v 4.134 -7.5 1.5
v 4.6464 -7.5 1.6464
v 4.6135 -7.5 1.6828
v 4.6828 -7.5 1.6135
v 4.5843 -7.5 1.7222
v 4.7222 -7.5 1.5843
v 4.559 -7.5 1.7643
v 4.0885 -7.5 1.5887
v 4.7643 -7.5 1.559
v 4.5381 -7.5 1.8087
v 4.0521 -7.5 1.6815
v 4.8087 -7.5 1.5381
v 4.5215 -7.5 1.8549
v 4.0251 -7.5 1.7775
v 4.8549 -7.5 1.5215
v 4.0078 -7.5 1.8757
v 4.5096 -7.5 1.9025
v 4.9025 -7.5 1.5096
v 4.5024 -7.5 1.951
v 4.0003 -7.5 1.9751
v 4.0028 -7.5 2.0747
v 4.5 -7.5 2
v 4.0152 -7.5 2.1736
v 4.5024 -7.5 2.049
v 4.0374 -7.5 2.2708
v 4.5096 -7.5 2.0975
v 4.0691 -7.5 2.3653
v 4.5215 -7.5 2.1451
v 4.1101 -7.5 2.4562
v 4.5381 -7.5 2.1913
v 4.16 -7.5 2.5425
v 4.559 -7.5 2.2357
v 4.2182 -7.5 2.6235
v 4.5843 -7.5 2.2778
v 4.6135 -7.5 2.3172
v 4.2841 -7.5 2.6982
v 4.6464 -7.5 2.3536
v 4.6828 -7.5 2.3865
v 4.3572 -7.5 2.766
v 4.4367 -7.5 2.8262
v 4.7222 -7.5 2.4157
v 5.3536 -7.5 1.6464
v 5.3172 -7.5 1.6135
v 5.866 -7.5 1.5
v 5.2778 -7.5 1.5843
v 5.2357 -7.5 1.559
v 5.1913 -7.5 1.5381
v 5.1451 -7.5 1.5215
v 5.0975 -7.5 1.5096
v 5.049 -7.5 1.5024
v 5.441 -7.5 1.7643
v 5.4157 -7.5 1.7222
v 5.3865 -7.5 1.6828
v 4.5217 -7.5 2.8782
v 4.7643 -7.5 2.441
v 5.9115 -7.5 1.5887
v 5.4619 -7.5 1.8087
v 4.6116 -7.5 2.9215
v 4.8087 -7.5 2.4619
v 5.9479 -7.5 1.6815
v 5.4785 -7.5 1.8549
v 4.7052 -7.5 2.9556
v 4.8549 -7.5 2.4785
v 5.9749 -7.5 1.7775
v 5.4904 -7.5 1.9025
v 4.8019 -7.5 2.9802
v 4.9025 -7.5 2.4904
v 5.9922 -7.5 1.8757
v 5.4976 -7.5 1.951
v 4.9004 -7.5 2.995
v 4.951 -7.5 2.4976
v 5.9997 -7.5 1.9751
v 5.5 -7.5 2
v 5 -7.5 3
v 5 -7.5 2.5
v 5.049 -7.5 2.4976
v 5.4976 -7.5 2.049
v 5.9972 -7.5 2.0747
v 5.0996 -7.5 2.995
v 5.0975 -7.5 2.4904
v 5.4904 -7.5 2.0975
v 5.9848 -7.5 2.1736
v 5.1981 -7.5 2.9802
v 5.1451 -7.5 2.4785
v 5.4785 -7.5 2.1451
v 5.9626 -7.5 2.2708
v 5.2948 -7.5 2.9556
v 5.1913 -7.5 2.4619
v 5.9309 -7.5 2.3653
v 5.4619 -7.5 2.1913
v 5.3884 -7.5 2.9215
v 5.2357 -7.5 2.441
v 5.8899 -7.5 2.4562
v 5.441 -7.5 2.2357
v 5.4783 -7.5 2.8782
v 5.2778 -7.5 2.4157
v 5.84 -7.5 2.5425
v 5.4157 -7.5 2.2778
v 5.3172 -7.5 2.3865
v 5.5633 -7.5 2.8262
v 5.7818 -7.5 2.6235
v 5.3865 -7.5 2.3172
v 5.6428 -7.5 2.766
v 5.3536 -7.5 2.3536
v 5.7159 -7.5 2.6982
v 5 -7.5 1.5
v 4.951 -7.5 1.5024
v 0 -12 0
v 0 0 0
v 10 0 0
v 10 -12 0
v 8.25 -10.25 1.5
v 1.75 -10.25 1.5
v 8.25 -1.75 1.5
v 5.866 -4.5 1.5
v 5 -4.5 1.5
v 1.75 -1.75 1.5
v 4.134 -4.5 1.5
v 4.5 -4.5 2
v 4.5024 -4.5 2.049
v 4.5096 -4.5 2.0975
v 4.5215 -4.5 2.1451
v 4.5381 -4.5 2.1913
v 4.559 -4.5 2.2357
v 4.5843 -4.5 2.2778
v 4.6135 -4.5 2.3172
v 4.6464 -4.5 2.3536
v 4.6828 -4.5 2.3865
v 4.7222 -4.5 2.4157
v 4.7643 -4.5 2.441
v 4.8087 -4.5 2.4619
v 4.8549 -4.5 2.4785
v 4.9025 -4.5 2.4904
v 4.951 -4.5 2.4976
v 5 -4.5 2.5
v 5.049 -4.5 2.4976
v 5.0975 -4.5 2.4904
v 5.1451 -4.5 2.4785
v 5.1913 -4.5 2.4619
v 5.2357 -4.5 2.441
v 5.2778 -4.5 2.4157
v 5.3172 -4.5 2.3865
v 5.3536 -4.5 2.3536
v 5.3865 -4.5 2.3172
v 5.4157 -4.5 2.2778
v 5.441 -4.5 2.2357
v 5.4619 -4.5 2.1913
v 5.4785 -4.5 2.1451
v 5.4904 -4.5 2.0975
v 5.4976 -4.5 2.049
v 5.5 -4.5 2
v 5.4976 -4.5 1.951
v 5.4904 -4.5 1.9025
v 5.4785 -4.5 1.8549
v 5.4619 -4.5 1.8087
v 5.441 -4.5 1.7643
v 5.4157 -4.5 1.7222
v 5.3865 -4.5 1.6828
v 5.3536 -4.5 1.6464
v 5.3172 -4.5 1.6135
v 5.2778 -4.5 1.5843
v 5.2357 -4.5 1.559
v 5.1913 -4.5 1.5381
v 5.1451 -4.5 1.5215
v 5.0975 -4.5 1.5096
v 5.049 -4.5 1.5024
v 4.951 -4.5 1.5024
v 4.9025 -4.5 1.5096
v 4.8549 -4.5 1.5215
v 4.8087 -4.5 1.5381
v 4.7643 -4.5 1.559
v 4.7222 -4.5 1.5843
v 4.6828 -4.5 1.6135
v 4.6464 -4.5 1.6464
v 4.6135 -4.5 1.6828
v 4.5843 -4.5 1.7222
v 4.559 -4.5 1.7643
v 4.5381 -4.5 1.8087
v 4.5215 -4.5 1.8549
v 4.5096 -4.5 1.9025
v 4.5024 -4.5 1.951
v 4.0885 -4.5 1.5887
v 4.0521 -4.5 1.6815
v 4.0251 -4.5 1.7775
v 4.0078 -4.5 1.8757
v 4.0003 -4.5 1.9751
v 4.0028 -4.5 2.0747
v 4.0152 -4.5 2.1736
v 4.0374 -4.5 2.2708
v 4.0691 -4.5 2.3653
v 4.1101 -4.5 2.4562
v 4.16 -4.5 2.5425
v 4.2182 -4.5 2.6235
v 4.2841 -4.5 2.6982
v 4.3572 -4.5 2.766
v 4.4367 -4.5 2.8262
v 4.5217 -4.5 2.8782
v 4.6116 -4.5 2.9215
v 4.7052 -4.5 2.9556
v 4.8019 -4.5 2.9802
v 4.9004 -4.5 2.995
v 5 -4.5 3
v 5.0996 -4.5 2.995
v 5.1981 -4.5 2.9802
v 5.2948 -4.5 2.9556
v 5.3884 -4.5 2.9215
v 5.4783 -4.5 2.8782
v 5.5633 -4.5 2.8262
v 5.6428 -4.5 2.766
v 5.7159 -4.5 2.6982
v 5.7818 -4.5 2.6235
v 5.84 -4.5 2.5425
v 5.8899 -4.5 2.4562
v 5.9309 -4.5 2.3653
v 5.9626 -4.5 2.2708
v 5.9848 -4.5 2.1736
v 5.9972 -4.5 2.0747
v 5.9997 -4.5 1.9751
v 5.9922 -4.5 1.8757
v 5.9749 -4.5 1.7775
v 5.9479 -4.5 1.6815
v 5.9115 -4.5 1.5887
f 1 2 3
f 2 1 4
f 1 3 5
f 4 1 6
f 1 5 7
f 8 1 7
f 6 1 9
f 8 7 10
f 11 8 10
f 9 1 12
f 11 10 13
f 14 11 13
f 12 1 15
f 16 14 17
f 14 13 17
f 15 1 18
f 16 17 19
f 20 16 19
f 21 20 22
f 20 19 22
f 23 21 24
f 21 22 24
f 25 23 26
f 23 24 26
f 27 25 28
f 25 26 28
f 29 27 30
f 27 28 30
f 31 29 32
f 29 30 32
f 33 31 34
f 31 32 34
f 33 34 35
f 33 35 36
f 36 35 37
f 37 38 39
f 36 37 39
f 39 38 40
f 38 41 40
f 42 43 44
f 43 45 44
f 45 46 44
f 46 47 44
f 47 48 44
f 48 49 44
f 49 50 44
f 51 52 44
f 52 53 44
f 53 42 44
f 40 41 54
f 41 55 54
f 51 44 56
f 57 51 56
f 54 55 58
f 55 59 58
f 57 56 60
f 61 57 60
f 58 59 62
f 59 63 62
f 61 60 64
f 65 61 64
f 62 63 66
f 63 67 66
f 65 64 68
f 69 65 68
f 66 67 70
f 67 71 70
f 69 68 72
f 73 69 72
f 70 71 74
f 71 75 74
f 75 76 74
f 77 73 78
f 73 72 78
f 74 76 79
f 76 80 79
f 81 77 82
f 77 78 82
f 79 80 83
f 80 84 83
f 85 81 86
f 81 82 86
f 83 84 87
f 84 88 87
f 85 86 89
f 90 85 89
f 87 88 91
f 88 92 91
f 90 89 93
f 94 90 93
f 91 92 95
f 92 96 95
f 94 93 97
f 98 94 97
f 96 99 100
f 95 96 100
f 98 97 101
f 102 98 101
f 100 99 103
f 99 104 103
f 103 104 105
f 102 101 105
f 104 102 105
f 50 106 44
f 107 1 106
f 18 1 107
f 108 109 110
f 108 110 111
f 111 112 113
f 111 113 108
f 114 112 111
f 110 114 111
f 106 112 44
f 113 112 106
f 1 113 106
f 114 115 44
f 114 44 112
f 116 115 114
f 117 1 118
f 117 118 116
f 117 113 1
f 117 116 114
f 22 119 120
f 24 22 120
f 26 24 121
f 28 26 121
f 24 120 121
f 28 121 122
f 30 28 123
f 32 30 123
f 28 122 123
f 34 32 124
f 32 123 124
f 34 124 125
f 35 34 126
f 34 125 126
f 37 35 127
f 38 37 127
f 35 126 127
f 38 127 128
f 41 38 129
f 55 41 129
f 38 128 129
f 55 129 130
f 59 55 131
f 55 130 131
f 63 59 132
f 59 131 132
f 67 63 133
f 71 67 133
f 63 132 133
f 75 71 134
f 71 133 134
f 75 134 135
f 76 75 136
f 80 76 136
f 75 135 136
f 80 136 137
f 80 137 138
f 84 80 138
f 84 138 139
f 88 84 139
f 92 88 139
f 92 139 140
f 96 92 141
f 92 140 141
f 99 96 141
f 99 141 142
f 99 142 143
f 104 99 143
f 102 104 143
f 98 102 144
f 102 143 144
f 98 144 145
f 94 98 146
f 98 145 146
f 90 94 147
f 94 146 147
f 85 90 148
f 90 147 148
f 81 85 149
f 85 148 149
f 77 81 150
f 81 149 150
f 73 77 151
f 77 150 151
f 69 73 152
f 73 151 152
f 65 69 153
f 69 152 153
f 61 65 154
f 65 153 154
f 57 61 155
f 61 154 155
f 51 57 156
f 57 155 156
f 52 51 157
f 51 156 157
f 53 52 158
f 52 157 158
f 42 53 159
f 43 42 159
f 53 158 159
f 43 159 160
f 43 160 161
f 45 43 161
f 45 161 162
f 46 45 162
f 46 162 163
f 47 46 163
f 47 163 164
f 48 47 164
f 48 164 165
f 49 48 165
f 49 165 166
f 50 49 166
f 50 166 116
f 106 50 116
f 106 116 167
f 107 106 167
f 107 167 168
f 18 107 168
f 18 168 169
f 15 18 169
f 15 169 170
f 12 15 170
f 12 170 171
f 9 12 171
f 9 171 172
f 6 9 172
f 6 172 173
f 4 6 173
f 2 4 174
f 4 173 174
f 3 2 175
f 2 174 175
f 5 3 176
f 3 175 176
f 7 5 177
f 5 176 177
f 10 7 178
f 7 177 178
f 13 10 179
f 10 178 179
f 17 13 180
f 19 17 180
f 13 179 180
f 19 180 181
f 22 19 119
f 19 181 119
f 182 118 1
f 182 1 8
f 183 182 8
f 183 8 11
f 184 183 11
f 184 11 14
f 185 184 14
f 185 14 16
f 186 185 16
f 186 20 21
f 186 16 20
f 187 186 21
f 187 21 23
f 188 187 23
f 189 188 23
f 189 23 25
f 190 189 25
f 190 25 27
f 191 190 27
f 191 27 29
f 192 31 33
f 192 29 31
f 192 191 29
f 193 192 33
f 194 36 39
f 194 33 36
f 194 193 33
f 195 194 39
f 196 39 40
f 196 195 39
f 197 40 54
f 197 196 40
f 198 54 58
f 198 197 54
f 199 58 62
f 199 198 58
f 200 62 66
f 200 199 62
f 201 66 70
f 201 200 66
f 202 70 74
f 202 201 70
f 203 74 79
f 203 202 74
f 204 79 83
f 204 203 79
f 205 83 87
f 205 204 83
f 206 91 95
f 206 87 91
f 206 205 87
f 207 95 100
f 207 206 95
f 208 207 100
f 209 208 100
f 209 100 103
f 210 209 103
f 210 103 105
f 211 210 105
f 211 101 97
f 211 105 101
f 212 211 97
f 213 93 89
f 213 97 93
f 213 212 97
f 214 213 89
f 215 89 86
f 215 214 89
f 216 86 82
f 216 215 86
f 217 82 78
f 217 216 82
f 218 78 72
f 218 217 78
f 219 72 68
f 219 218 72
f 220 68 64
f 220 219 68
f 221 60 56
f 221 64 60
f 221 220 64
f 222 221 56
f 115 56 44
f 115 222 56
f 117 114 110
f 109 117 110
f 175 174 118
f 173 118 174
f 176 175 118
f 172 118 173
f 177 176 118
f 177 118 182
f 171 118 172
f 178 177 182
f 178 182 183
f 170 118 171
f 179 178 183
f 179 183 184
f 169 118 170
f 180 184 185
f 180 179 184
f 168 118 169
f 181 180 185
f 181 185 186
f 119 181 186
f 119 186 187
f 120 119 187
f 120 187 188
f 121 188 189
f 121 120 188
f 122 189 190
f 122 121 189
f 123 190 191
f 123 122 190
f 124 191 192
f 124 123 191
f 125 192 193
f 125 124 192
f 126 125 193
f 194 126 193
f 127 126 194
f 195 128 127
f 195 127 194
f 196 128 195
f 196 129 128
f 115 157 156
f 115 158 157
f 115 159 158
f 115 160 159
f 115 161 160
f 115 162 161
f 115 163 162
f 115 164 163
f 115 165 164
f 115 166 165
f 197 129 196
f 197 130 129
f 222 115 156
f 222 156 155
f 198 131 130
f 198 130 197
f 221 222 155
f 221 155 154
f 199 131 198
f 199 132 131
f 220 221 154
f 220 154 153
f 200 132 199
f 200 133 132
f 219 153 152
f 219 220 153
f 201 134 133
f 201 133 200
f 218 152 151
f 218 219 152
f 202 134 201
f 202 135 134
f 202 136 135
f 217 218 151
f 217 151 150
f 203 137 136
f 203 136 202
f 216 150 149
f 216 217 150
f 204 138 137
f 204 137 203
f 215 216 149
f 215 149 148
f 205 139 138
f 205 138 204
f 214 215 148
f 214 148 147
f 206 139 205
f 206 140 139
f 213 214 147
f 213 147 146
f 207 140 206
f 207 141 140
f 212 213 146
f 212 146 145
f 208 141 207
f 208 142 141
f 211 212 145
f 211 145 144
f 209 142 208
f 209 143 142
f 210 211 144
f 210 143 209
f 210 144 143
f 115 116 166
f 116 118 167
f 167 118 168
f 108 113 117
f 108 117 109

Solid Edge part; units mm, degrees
sketch "Sketch1" plane through (0, 0, 0) normal (-1, 0, 0) x (0, -1, 0)
  line L0 (10.25, 1.5) -> (2.1916, 1.5)
  line L1 (2.1916, 1.5) -> (1.75, 1.5)
  line L2 (1.75, 1.5) -> (0, 0)
  line L3 (0, 0) -> (12, 0)
  line L4 (10.25, 1.5) -> (12, 0)
extrude "Protrusion1" add sketch "Sketch1" against normal blind 10
sketch "Sketch2" plane through (0, 0, 0) normal (0, 1, 0) x (-1, 0, 0)
  line L0 (-8.25, 1.5) -> (-10, 0)
  line L1 (-10, 0) -> (-10, 1.5)
  line L2 (-10, 1.5) -> (-8.25, 1.5)
  line L3 (-1.75, 1.5) -> (0, 0)
  line L4 (0, 1.5) -> (0, 0)
  line L5 (-1.75, 1.5) -> (0, 1.5)
extrude "Recorte_Extrudado_1" cut sketch "Sketch2" against normal blind 12.6
sketch "Sketch3" plane through (0, -4.5, 0) normal (0, 1, 0) x (-1, 0, 0)
  circle A0 centre (-5, 2) radius 1
extrude "Protrusion2" add sketch "Sketch3" against normal blind 3
sketch "Sketch4" plane through (5, -4.5, 2.25) normal (0, 1, 0) x (-1, 0, 0)
  circle A0 centre (0, -0.25) radius 0.5
extrude "Cutout1" cut sketch "Sketch4" against normal blind 3
